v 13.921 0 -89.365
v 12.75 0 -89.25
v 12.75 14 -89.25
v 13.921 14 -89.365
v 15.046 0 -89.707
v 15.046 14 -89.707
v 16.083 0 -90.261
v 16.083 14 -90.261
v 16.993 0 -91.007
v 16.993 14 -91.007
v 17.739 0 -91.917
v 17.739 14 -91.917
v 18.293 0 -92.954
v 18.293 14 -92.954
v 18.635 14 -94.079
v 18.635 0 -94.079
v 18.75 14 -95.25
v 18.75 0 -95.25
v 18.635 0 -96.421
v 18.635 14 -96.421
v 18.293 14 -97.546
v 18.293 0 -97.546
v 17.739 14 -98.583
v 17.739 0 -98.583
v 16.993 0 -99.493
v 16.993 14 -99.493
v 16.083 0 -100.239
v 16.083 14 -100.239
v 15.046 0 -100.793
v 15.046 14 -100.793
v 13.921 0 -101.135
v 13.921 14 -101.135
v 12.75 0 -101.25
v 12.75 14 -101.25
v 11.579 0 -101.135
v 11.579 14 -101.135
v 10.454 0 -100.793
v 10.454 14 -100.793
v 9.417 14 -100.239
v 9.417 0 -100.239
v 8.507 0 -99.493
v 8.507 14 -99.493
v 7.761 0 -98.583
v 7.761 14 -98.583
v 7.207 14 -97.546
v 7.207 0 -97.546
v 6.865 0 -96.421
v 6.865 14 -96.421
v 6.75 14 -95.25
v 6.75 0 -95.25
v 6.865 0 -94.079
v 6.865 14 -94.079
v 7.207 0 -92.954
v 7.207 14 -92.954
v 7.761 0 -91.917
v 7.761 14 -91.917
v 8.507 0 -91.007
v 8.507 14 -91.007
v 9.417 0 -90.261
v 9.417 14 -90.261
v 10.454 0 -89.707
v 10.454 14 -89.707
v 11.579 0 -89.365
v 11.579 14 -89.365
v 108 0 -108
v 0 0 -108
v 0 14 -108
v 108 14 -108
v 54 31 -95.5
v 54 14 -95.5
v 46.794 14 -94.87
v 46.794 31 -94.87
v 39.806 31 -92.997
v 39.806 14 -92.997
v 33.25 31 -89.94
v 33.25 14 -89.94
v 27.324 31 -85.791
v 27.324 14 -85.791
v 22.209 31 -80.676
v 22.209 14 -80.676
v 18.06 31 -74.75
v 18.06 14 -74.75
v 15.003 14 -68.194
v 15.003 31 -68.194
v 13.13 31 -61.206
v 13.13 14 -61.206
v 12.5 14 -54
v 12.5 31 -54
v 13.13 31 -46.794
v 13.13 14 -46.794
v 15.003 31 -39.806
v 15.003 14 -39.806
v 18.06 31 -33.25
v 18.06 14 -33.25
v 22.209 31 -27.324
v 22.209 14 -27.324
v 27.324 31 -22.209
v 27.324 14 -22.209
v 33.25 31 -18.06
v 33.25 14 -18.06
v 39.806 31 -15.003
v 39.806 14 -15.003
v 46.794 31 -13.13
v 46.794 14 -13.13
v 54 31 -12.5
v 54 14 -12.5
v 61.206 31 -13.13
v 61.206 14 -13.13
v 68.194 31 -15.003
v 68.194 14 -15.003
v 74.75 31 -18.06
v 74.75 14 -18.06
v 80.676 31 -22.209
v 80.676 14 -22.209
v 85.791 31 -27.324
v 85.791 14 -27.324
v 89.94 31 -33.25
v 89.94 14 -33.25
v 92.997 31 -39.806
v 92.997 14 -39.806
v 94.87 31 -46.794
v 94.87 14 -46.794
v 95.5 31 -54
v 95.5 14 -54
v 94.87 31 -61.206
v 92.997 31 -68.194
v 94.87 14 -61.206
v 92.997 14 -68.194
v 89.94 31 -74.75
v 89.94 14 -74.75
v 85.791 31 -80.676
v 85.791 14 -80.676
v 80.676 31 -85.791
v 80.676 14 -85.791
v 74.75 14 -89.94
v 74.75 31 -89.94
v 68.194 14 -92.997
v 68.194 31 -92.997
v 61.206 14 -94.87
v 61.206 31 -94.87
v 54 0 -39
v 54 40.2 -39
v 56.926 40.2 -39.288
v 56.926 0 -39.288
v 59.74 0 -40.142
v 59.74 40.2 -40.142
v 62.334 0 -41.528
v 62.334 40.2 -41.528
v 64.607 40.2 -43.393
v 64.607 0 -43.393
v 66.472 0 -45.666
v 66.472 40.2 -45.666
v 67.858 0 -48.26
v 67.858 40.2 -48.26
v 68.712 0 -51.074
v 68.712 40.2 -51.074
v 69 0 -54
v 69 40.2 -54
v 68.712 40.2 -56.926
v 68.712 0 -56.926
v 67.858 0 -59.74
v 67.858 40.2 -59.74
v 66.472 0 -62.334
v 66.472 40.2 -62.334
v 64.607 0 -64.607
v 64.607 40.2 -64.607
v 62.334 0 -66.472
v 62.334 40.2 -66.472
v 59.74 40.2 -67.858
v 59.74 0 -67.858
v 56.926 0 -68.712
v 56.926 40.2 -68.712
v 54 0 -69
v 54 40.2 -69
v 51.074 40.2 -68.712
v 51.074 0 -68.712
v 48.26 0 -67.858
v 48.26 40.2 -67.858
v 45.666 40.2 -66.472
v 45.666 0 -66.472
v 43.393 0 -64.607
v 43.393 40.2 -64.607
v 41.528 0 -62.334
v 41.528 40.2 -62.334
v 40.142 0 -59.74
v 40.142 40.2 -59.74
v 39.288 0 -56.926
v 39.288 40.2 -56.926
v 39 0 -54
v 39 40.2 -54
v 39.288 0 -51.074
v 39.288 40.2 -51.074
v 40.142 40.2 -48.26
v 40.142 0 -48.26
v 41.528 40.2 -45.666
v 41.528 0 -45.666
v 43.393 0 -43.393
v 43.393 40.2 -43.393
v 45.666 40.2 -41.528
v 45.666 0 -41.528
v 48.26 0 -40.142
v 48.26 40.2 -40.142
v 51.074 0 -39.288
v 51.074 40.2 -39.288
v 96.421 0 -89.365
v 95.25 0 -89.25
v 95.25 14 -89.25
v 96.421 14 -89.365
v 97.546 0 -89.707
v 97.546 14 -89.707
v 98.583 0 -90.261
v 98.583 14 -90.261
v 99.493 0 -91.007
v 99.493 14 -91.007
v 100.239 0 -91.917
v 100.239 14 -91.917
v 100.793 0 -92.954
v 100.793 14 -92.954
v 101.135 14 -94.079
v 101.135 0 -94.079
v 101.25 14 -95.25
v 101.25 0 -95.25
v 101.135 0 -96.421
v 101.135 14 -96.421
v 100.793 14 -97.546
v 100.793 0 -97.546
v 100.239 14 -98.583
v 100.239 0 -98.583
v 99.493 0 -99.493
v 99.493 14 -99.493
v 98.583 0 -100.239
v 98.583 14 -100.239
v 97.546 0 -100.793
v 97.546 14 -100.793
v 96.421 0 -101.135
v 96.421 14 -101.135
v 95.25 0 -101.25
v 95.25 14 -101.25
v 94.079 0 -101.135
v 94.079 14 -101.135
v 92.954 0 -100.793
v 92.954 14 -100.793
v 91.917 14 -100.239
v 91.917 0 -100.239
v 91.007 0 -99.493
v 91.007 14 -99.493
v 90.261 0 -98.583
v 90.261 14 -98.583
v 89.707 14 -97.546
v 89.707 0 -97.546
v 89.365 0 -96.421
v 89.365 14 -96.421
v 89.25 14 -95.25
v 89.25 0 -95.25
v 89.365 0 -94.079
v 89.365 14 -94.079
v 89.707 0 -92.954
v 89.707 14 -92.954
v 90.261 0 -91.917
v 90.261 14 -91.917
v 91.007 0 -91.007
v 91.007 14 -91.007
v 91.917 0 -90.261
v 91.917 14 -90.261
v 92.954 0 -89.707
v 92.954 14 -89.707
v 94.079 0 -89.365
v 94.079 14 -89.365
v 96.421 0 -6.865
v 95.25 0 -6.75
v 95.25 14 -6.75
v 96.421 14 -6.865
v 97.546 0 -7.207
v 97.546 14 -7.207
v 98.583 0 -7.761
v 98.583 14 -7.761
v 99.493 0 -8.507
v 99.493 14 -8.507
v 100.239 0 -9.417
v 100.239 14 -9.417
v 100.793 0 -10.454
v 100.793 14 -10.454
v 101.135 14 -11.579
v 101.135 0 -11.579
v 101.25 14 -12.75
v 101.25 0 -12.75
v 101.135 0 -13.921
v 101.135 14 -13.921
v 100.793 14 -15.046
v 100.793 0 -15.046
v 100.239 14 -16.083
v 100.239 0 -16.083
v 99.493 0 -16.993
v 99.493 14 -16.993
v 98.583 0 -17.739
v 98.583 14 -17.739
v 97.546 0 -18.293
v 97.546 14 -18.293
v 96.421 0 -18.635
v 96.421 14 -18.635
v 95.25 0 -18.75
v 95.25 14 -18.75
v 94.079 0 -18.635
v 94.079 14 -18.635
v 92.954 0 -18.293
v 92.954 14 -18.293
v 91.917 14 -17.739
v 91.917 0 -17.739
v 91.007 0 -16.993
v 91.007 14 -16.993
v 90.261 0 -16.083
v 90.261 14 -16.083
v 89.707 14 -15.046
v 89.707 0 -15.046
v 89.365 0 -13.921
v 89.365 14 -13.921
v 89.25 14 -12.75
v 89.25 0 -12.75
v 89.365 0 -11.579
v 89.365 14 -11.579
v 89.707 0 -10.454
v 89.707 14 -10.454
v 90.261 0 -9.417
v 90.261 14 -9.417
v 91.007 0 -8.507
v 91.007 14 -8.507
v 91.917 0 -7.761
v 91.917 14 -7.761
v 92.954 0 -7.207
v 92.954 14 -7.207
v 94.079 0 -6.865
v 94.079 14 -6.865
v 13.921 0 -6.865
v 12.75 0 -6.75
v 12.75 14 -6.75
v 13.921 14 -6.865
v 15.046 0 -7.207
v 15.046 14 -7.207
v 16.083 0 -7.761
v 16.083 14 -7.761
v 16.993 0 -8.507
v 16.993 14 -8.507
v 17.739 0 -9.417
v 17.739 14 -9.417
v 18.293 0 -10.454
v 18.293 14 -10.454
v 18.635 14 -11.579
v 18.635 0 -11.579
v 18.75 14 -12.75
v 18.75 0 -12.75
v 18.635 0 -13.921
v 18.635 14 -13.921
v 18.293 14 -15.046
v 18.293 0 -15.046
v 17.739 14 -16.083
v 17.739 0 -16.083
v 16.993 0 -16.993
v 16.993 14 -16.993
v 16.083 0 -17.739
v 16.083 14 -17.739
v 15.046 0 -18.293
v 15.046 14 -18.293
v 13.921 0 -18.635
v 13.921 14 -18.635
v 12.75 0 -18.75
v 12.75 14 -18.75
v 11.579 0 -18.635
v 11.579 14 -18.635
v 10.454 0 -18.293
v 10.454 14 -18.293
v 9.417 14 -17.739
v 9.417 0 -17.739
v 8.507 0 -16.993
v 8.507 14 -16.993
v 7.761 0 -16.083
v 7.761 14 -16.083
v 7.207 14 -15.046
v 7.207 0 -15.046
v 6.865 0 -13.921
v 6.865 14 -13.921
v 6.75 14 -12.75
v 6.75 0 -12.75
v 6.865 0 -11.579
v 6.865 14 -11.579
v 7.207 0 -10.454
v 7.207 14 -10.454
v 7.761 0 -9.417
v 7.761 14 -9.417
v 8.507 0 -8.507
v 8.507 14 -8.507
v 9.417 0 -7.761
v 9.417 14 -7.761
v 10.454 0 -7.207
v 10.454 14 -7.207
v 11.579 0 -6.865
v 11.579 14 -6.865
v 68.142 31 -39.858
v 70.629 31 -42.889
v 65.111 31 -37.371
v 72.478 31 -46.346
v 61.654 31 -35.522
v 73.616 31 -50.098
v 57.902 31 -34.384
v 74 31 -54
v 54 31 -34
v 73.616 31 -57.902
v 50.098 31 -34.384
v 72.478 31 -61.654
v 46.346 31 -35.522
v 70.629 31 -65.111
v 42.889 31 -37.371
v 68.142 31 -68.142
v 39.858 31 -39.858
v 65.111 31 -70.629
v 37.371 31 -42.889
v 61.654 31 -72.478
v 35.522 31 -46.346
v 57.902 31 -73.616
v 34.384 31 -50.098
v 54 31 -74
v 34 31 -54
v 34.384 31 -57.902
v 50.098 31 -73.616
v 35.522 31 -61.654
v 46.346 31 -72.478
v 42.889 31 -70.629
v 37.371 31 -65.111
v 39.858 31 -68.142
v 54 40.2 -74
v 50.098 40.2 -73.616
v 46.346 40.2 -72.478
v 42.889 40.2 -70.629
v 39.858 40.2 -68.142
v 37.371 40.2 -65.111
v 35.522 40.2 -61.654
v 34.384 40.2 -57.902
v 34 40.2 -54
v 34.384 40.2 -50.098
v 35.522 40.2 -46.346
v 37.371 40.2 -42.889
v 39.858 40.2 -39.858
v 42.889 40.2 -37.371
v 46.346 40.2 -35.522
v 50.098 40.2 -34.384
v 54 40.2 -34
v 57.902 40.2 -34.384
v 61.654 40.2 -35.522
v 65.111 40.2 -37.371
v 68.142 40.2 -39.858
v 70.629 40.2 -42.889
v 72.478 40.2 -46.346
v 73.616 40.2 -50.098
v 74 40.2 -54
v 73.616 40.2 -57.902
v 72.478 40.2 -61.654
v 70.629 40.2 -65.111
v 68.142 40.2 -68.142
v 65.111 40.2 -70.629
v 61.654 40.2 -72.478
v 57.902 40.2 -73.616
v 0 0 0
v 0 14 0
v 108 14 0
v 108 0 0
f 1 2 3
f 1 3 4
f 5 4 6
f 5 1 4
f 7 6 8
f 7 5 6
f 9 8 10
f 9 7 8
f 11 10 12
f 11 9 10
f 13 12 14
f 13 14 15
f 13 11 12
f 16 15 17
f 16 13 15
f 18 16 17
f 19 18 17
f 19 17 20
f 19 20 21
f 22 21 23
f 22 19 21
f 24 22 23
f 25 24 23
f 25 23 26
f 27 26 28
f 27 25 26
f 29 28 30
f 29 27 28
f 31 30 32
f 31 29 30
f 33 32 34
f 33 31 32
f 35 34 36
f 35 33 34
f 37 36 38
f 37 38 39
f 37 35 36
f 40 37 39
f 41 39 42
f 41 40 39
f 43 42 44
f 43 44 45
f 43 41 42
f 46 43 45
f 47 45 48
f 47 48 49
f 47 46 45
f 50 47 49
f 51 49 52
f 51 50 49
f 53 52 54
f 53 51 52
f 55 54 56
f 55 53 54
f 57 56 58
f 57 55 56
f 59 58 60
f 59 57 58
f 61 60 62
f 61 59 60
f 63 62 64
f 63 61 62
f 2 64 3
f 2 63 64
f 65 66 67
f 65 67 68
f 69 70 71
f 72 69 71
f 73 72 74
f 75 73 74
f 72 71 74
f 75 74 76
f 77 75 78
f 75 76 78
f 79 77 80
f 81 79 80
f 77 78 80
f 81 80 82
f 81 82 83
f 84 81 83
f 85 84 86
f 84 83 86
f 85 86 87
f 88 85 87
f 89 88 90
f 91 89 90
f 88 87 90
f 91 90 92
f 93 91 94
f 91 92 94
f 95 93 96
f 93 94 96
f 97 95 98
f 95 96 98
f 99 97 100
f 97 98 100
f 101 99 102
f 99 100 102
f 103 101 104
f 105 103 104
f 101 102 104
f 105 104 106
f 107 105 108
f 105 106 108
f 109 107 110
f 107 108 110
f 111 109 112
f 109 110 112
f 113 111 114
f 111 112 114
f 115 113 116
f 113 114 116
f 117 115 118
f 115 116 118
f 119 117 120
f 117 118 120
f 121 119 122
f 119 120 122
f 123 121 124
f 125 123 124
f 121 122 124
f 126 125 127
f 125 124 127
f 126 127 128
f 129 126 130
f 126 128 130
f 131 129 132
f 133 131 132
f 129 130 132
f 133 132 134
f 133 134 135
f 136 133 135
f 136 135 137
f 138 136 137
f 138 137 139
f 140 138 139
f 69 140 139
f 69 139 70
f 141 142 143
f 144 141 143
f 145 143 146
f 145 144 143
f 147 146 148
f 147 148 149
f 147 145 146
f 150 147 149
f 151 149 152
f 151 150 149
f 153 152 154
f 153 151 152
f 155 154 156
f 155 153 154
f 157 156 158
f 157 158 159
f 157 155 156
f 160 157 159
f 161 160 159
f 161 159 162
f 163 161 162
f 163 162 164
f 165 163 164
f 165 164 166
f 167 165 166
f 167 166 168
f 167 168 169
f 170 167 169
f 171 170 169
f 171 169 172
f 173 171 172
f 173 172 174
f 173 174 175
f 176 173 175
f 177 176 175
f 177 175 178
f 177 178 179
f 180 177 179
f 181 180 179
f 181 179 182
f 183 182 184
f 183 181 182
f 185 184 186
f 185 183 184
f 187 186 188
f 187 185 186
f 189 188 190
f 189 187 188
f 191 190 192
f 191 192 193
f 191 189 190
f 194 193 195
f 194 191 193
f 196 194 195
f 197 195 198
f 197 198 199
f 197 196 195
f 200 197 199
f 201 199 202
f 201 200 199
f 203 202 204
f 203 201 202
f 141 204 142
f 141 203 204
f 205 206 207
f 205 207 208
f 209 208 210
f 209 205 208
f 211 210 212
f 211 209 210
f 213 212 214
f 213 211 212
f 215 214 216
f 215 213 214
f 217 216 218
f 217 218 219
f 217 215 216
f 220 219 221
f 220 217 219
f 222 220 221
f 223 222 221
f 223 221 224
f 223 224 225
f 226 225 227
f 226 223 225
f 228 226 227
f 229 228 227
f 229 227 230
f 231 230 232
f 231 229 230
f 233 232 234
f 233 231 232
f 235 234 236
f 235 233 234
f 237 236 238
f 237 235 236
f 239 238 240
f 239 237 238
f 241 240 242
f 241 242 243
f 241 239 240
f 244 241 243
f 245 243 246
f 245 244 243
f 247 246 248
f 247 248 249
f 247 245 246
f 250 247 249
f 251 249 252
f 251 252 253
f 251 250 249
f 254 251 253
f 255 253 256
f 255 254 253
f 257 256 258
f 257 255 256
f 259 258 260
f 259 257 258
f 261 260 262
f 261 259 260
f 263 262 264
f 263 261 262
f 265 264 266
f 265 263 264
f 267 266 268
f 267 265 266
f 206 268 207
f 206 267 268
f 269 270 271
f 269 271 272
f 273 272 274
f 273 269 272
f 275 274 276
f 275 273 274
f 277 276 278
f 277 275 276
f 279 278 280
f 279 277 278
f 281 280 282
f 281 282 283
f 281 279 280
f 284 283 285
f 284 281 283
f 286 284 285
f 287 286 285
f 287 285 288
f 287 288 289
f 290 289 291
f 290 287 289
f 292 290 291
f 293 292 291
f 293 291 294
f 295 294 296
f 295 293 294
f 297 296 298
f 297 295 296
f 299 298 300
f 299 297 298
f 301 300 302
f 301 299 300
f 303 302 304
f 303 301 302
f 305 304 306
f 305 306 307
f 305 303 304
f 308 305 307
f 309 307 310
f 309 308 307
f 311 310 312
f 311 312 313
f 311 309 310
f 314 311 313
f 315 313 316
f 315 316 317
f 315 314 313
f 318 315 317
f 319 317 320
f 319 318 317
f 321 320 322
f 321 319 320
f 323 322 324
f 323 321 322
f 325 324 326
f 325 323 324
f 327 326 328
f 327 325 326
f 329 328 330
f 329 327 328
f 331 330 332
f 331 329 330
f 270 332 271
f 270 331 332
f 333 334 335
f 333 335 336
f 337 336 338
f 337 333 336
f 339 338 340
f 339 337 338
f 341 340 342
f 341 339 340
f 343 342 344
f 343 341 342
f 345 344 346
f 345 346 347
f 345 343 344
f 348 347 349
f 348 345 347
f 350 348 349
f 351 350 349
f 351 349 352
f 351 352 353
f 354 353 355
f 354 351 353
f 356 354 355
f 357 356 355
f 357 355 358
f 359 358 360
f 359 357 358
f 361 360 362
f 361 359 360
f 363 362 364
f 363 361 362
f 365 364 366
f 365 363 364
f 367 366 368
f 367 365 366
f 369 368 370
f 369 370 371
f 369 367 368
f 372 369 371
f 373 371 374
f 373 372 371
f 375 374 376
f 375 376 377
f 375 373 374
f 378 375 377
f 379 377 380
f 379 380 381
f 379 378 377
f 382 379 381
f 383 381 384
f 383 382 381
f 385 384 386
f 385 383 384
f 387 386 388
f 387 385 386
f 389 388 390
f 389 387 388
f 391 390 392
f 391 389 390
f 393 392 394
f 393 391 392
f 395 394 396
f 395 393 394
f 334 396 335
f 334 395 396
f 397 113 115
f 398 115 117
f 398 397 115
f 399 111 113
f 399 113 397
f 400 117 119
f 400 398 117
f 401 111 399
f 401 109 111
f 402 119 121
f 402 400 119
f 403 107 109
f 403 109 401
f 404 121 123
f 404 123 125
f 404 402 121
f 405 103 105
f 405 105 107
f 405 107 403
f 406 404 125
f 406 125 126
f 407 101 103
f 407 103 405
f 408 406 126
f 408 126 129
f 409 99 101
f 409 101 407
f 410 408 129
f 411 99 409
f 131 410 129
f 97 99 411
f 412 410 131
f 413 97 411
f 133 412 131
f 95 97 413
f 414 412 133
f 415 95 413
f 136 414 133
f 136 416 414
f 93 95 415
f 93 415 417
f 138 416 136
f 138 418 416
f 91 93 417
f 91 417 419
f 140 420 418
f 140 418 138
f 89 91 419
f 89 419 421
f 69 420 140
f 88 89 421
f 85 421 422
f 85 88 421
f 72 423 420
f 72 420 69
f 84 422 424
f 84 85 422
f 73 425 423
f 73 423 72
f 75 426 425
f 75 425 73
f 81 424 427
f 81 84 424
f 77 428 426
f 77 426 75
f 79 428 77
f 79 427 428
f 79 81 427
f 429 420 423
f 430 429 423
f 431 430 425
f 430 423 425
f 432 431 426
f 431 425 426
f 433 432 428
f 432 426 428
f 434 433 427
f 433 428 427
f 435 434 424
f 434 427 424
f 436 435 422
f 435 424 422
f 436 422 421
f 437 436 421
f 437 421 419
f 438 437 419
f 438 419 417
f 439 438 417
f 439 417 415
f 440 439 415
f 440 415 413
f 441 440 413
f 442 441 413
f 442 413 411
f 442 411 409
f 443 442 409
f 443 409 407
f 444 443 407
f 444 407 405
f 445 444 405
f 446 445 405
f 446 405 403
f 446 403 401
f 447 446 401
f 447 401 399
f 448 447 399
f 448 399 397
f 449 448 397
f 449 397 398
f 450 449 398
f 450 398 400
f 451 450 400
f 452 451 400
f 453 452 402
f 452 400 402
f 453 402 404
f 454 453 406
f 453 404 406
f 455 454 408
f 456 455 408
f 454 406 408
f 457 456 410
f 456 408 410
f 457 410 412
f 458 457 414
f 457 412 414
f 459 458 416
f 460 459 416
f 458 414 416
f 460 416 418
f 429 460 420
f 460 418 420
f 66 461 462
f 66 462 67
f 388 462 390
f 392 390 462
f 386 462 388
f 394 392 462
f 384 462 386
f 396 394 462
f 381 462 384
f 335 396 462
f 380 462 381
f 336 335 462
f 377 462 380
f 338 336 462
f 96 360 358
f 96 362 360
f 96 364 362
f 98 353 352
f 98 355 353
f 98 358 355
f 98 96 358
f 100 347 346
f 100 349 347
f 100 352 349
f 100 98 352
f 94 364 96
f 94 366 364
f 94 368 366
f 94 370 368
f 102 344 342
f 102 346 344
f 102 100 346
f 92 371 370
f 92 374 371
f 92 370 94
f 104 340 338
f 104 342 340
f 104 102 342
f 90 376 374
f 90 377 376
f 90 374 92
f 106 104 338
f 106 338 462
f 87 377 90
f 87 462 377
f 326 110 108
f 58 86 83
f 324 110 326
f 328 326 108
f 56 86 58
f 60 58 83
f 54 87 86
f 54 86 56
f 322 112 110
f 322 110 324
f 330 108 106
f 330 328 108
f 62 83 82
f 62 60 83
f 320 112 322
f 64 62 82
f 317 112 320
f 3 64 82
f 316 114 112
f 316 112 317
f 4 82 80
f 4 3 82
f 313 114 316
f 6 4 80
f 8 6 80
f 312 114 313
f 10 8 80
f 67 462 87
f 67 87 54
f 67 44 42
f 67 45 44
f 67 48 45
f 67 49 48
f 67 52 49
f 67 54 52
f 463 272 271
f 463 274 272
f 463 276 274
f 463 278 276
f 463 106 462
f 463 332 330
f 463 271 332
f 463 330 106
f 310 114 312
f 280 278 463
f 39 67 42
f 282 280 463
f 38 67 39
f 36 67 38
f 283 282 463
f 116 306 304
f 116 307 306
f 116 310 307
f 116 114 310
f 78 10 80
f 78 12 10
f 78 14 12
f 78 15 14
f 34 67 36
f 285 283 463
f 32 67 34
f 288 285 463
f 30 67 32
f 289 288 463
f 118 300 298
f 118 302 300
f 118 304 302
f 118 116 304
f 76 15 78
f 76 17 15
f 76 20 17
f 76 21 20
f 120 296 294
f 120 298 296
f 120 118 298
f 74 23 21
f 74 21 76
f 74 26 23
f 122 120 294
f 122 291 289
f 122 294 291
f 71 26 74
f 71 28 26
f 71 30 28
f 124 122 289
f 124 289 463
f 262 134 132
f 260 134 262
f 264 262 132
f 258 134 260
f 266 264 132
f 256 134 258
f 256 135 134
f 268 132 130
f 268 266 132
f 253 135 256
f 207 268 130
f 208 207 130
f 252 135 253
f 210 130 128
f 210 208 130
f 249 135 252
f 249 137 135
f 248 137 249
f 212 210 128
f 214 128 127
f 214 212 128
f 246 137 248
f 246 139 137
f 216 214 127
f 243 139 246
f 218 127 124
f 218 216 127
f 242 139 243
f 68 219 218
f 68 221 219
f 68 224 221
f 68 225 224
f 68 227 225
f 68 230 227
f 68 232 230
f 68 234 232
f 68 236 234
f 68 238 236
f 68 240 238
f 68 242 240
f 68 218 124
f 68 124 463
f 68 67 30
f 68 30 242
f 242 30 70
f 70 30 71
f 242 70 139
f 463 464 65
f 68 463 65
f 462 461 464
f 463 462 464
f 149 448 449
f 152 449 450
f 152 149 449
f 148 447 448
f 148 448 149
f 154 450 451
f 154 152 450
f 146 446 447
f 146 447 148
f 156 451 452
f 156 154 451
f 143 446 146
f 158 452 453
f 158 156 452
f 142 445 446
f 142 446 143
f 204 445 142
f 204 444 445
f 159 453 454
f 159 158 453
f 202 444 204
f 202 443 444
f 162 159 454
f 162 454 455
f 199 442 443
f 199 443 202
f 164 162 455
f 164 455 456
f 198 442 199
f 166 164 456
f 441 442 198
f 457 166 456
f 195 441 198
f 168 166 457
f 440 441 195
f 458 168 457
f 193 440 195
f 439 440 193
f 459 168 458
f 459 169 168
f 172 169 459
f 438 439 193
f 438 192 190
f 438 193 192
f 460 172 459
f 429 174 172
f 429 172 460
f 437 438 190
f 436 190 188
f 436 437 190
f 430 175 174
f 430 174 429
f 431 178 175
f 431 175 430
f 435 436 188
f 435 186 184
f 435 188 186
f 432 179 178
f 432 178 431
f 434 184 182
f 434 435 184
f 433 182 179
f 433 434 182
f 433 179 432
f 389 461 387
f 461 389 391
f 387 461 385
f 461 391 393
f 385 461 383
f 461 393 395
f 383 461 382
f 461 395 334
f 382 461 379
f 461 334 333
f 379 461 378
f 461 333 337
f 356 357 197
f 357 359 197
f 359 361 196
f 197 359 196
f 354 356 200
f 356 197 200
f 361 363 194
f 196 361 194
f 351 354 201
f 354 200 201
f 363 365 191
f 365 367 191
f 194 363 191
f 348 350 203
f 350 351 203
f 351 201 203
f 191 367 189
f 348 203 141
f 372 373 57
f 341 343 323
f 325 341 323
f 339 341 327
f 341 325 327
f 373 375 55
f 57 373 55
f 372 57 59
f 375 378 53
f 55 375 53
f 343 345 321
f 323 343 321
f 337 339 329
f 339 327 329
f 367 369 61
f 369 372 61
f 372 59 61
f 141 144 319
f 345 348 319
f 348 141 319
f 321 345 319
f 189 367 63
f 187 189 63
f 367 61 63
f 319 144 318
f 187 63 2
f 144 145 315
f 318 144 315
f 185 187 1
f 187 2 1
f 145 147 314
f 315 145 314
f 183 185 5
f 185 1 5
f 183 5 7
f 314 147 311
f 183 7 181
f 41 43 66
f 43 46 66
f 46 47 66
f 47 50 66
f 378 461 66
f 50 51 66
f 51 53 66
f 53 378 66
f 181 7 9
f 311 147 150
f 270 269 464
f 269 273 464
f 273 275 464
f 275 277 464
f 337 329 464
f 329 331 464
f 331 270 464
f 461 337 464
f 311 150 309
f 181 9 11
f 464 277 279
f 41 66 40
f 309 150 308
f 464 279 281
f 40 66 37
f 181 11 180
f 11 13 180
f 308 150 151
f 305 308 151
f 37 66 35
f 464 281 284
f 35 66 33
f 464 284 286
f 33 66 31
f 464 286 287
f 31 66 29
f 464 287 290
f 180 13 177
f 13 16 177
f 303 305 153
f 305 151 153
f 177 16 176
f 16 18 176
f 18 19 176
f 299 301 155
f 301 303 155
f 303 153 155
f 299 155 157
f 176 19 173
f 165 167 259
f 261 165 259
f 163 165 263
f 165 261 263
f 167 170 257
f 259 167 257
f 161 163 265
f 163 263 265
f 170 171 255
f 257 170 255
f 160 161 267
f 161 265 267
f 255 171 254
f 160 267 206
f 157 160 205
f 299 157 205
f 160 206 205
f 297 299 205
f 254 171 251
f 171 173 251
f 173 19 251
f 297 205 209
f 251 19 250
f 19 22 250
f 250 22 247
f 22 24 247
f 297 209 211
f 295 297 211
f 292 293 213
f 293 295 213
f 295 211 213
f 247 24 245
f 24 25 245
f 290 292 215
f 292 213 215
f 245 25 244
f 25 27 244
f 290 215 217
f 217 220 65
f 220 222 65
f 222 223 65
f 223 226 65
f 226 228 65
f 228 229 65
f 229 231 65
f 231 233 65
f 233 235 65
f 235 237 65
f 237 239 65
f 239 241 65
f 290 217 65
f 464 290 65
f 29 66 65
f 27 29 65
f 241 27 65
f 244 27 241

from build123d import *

# Parameters (mm, degrees)
SKETCH1_W           = 108
SKETCH1_H           = 108
SKETCH1_R           = 6
SKETCH1_R_2         = 15
BOSS_EXTRUDE1_DEPTH = 14
SKETCH2_R           = 20
SKETCH2_R_2         = 15
BOSS_EXTRUDE2_DEPTH = 26.2
SKETCH3_R           = 41.5
SKETCH3_R_2         = 15
BOSS_EXTRUDE3_DEPTH = 17


with BuildPart() as part:
    # Sketch1 → Boss-Extrude1 (new body)
    with BuildSketch(Plane(origin=(0, 0, 0), x_dir=(1, 0, 0), z_dir=(0, 1, 0))):
        with Locations((54, 54)):
            Rectangle(SKETCH1_W, SKETCH1_H)
        with Locations(Location((12.75, 12.75, 0), (0, 0, 270))):
            Circle(SKETCH1_R, mode=Mode.SUBTRACT)
        with Locations(Location((54, 54, 0), (0, 0, 270))):
            Circle(SKETCH1_R_2, mode=Mode.SUBTRACT)
        with Locations(Location((95.25, 12.75, 0), (0, 0, 270))):
            Circle(SKETCH1_R, mode=Mode.SUBTRACT)
        with Locations(Location((95.25, 95.25, 0), (0, 0, 270))):
            Circle(SKETCH1_R, mode=Mode.SUBTRACT)
        with Locations(Location((12.75, 95.25, 0), (0, 0, 270))):
            Circle(SKETCH1_R, mode=Mode.SUBTRACT)
    extrude(amount=BOSS_EXTRUDE1_DEPTH)

    # Sketch2 → Boss-Extrude2 (add)
    with BuildSketch(Plane(origin=(0, 14, 0), x_dir=(1, 0, 0), z_dir=(0, 1, 0))):
        with Locations(Location((54, 54, 0), (0, 0, 90))):
            Circle(SKETCH2_R)
        with Locations(Location((54, 54, 0), (0, 0, 270))):
            Circle(SKETCH2_R_2, mode=Mode.SUBTRACT)
    extrude(amount=BOSS_EXTRUDE2_DEPTH)

    # Sketch3 → Boss-Extrude3 (add)
    with BuildSketch(Plane(origin=(0, 14, 0), x_dir=(1, 0, 0), z_dir=(0, 1, 0))):
        with Locations(Location((54, 54, 0), (0, 0, 90))):
            Circle(SKETCH3_R)
        with Locations(Location((54, 54, 0), (0, 0, 270))):
            Circle(SKETCH3_R_2, mode=Mode.SUBTRACT)
    extrude(amount=BOSS_EXTRUDE3_DEPTH)


solid = part.part
